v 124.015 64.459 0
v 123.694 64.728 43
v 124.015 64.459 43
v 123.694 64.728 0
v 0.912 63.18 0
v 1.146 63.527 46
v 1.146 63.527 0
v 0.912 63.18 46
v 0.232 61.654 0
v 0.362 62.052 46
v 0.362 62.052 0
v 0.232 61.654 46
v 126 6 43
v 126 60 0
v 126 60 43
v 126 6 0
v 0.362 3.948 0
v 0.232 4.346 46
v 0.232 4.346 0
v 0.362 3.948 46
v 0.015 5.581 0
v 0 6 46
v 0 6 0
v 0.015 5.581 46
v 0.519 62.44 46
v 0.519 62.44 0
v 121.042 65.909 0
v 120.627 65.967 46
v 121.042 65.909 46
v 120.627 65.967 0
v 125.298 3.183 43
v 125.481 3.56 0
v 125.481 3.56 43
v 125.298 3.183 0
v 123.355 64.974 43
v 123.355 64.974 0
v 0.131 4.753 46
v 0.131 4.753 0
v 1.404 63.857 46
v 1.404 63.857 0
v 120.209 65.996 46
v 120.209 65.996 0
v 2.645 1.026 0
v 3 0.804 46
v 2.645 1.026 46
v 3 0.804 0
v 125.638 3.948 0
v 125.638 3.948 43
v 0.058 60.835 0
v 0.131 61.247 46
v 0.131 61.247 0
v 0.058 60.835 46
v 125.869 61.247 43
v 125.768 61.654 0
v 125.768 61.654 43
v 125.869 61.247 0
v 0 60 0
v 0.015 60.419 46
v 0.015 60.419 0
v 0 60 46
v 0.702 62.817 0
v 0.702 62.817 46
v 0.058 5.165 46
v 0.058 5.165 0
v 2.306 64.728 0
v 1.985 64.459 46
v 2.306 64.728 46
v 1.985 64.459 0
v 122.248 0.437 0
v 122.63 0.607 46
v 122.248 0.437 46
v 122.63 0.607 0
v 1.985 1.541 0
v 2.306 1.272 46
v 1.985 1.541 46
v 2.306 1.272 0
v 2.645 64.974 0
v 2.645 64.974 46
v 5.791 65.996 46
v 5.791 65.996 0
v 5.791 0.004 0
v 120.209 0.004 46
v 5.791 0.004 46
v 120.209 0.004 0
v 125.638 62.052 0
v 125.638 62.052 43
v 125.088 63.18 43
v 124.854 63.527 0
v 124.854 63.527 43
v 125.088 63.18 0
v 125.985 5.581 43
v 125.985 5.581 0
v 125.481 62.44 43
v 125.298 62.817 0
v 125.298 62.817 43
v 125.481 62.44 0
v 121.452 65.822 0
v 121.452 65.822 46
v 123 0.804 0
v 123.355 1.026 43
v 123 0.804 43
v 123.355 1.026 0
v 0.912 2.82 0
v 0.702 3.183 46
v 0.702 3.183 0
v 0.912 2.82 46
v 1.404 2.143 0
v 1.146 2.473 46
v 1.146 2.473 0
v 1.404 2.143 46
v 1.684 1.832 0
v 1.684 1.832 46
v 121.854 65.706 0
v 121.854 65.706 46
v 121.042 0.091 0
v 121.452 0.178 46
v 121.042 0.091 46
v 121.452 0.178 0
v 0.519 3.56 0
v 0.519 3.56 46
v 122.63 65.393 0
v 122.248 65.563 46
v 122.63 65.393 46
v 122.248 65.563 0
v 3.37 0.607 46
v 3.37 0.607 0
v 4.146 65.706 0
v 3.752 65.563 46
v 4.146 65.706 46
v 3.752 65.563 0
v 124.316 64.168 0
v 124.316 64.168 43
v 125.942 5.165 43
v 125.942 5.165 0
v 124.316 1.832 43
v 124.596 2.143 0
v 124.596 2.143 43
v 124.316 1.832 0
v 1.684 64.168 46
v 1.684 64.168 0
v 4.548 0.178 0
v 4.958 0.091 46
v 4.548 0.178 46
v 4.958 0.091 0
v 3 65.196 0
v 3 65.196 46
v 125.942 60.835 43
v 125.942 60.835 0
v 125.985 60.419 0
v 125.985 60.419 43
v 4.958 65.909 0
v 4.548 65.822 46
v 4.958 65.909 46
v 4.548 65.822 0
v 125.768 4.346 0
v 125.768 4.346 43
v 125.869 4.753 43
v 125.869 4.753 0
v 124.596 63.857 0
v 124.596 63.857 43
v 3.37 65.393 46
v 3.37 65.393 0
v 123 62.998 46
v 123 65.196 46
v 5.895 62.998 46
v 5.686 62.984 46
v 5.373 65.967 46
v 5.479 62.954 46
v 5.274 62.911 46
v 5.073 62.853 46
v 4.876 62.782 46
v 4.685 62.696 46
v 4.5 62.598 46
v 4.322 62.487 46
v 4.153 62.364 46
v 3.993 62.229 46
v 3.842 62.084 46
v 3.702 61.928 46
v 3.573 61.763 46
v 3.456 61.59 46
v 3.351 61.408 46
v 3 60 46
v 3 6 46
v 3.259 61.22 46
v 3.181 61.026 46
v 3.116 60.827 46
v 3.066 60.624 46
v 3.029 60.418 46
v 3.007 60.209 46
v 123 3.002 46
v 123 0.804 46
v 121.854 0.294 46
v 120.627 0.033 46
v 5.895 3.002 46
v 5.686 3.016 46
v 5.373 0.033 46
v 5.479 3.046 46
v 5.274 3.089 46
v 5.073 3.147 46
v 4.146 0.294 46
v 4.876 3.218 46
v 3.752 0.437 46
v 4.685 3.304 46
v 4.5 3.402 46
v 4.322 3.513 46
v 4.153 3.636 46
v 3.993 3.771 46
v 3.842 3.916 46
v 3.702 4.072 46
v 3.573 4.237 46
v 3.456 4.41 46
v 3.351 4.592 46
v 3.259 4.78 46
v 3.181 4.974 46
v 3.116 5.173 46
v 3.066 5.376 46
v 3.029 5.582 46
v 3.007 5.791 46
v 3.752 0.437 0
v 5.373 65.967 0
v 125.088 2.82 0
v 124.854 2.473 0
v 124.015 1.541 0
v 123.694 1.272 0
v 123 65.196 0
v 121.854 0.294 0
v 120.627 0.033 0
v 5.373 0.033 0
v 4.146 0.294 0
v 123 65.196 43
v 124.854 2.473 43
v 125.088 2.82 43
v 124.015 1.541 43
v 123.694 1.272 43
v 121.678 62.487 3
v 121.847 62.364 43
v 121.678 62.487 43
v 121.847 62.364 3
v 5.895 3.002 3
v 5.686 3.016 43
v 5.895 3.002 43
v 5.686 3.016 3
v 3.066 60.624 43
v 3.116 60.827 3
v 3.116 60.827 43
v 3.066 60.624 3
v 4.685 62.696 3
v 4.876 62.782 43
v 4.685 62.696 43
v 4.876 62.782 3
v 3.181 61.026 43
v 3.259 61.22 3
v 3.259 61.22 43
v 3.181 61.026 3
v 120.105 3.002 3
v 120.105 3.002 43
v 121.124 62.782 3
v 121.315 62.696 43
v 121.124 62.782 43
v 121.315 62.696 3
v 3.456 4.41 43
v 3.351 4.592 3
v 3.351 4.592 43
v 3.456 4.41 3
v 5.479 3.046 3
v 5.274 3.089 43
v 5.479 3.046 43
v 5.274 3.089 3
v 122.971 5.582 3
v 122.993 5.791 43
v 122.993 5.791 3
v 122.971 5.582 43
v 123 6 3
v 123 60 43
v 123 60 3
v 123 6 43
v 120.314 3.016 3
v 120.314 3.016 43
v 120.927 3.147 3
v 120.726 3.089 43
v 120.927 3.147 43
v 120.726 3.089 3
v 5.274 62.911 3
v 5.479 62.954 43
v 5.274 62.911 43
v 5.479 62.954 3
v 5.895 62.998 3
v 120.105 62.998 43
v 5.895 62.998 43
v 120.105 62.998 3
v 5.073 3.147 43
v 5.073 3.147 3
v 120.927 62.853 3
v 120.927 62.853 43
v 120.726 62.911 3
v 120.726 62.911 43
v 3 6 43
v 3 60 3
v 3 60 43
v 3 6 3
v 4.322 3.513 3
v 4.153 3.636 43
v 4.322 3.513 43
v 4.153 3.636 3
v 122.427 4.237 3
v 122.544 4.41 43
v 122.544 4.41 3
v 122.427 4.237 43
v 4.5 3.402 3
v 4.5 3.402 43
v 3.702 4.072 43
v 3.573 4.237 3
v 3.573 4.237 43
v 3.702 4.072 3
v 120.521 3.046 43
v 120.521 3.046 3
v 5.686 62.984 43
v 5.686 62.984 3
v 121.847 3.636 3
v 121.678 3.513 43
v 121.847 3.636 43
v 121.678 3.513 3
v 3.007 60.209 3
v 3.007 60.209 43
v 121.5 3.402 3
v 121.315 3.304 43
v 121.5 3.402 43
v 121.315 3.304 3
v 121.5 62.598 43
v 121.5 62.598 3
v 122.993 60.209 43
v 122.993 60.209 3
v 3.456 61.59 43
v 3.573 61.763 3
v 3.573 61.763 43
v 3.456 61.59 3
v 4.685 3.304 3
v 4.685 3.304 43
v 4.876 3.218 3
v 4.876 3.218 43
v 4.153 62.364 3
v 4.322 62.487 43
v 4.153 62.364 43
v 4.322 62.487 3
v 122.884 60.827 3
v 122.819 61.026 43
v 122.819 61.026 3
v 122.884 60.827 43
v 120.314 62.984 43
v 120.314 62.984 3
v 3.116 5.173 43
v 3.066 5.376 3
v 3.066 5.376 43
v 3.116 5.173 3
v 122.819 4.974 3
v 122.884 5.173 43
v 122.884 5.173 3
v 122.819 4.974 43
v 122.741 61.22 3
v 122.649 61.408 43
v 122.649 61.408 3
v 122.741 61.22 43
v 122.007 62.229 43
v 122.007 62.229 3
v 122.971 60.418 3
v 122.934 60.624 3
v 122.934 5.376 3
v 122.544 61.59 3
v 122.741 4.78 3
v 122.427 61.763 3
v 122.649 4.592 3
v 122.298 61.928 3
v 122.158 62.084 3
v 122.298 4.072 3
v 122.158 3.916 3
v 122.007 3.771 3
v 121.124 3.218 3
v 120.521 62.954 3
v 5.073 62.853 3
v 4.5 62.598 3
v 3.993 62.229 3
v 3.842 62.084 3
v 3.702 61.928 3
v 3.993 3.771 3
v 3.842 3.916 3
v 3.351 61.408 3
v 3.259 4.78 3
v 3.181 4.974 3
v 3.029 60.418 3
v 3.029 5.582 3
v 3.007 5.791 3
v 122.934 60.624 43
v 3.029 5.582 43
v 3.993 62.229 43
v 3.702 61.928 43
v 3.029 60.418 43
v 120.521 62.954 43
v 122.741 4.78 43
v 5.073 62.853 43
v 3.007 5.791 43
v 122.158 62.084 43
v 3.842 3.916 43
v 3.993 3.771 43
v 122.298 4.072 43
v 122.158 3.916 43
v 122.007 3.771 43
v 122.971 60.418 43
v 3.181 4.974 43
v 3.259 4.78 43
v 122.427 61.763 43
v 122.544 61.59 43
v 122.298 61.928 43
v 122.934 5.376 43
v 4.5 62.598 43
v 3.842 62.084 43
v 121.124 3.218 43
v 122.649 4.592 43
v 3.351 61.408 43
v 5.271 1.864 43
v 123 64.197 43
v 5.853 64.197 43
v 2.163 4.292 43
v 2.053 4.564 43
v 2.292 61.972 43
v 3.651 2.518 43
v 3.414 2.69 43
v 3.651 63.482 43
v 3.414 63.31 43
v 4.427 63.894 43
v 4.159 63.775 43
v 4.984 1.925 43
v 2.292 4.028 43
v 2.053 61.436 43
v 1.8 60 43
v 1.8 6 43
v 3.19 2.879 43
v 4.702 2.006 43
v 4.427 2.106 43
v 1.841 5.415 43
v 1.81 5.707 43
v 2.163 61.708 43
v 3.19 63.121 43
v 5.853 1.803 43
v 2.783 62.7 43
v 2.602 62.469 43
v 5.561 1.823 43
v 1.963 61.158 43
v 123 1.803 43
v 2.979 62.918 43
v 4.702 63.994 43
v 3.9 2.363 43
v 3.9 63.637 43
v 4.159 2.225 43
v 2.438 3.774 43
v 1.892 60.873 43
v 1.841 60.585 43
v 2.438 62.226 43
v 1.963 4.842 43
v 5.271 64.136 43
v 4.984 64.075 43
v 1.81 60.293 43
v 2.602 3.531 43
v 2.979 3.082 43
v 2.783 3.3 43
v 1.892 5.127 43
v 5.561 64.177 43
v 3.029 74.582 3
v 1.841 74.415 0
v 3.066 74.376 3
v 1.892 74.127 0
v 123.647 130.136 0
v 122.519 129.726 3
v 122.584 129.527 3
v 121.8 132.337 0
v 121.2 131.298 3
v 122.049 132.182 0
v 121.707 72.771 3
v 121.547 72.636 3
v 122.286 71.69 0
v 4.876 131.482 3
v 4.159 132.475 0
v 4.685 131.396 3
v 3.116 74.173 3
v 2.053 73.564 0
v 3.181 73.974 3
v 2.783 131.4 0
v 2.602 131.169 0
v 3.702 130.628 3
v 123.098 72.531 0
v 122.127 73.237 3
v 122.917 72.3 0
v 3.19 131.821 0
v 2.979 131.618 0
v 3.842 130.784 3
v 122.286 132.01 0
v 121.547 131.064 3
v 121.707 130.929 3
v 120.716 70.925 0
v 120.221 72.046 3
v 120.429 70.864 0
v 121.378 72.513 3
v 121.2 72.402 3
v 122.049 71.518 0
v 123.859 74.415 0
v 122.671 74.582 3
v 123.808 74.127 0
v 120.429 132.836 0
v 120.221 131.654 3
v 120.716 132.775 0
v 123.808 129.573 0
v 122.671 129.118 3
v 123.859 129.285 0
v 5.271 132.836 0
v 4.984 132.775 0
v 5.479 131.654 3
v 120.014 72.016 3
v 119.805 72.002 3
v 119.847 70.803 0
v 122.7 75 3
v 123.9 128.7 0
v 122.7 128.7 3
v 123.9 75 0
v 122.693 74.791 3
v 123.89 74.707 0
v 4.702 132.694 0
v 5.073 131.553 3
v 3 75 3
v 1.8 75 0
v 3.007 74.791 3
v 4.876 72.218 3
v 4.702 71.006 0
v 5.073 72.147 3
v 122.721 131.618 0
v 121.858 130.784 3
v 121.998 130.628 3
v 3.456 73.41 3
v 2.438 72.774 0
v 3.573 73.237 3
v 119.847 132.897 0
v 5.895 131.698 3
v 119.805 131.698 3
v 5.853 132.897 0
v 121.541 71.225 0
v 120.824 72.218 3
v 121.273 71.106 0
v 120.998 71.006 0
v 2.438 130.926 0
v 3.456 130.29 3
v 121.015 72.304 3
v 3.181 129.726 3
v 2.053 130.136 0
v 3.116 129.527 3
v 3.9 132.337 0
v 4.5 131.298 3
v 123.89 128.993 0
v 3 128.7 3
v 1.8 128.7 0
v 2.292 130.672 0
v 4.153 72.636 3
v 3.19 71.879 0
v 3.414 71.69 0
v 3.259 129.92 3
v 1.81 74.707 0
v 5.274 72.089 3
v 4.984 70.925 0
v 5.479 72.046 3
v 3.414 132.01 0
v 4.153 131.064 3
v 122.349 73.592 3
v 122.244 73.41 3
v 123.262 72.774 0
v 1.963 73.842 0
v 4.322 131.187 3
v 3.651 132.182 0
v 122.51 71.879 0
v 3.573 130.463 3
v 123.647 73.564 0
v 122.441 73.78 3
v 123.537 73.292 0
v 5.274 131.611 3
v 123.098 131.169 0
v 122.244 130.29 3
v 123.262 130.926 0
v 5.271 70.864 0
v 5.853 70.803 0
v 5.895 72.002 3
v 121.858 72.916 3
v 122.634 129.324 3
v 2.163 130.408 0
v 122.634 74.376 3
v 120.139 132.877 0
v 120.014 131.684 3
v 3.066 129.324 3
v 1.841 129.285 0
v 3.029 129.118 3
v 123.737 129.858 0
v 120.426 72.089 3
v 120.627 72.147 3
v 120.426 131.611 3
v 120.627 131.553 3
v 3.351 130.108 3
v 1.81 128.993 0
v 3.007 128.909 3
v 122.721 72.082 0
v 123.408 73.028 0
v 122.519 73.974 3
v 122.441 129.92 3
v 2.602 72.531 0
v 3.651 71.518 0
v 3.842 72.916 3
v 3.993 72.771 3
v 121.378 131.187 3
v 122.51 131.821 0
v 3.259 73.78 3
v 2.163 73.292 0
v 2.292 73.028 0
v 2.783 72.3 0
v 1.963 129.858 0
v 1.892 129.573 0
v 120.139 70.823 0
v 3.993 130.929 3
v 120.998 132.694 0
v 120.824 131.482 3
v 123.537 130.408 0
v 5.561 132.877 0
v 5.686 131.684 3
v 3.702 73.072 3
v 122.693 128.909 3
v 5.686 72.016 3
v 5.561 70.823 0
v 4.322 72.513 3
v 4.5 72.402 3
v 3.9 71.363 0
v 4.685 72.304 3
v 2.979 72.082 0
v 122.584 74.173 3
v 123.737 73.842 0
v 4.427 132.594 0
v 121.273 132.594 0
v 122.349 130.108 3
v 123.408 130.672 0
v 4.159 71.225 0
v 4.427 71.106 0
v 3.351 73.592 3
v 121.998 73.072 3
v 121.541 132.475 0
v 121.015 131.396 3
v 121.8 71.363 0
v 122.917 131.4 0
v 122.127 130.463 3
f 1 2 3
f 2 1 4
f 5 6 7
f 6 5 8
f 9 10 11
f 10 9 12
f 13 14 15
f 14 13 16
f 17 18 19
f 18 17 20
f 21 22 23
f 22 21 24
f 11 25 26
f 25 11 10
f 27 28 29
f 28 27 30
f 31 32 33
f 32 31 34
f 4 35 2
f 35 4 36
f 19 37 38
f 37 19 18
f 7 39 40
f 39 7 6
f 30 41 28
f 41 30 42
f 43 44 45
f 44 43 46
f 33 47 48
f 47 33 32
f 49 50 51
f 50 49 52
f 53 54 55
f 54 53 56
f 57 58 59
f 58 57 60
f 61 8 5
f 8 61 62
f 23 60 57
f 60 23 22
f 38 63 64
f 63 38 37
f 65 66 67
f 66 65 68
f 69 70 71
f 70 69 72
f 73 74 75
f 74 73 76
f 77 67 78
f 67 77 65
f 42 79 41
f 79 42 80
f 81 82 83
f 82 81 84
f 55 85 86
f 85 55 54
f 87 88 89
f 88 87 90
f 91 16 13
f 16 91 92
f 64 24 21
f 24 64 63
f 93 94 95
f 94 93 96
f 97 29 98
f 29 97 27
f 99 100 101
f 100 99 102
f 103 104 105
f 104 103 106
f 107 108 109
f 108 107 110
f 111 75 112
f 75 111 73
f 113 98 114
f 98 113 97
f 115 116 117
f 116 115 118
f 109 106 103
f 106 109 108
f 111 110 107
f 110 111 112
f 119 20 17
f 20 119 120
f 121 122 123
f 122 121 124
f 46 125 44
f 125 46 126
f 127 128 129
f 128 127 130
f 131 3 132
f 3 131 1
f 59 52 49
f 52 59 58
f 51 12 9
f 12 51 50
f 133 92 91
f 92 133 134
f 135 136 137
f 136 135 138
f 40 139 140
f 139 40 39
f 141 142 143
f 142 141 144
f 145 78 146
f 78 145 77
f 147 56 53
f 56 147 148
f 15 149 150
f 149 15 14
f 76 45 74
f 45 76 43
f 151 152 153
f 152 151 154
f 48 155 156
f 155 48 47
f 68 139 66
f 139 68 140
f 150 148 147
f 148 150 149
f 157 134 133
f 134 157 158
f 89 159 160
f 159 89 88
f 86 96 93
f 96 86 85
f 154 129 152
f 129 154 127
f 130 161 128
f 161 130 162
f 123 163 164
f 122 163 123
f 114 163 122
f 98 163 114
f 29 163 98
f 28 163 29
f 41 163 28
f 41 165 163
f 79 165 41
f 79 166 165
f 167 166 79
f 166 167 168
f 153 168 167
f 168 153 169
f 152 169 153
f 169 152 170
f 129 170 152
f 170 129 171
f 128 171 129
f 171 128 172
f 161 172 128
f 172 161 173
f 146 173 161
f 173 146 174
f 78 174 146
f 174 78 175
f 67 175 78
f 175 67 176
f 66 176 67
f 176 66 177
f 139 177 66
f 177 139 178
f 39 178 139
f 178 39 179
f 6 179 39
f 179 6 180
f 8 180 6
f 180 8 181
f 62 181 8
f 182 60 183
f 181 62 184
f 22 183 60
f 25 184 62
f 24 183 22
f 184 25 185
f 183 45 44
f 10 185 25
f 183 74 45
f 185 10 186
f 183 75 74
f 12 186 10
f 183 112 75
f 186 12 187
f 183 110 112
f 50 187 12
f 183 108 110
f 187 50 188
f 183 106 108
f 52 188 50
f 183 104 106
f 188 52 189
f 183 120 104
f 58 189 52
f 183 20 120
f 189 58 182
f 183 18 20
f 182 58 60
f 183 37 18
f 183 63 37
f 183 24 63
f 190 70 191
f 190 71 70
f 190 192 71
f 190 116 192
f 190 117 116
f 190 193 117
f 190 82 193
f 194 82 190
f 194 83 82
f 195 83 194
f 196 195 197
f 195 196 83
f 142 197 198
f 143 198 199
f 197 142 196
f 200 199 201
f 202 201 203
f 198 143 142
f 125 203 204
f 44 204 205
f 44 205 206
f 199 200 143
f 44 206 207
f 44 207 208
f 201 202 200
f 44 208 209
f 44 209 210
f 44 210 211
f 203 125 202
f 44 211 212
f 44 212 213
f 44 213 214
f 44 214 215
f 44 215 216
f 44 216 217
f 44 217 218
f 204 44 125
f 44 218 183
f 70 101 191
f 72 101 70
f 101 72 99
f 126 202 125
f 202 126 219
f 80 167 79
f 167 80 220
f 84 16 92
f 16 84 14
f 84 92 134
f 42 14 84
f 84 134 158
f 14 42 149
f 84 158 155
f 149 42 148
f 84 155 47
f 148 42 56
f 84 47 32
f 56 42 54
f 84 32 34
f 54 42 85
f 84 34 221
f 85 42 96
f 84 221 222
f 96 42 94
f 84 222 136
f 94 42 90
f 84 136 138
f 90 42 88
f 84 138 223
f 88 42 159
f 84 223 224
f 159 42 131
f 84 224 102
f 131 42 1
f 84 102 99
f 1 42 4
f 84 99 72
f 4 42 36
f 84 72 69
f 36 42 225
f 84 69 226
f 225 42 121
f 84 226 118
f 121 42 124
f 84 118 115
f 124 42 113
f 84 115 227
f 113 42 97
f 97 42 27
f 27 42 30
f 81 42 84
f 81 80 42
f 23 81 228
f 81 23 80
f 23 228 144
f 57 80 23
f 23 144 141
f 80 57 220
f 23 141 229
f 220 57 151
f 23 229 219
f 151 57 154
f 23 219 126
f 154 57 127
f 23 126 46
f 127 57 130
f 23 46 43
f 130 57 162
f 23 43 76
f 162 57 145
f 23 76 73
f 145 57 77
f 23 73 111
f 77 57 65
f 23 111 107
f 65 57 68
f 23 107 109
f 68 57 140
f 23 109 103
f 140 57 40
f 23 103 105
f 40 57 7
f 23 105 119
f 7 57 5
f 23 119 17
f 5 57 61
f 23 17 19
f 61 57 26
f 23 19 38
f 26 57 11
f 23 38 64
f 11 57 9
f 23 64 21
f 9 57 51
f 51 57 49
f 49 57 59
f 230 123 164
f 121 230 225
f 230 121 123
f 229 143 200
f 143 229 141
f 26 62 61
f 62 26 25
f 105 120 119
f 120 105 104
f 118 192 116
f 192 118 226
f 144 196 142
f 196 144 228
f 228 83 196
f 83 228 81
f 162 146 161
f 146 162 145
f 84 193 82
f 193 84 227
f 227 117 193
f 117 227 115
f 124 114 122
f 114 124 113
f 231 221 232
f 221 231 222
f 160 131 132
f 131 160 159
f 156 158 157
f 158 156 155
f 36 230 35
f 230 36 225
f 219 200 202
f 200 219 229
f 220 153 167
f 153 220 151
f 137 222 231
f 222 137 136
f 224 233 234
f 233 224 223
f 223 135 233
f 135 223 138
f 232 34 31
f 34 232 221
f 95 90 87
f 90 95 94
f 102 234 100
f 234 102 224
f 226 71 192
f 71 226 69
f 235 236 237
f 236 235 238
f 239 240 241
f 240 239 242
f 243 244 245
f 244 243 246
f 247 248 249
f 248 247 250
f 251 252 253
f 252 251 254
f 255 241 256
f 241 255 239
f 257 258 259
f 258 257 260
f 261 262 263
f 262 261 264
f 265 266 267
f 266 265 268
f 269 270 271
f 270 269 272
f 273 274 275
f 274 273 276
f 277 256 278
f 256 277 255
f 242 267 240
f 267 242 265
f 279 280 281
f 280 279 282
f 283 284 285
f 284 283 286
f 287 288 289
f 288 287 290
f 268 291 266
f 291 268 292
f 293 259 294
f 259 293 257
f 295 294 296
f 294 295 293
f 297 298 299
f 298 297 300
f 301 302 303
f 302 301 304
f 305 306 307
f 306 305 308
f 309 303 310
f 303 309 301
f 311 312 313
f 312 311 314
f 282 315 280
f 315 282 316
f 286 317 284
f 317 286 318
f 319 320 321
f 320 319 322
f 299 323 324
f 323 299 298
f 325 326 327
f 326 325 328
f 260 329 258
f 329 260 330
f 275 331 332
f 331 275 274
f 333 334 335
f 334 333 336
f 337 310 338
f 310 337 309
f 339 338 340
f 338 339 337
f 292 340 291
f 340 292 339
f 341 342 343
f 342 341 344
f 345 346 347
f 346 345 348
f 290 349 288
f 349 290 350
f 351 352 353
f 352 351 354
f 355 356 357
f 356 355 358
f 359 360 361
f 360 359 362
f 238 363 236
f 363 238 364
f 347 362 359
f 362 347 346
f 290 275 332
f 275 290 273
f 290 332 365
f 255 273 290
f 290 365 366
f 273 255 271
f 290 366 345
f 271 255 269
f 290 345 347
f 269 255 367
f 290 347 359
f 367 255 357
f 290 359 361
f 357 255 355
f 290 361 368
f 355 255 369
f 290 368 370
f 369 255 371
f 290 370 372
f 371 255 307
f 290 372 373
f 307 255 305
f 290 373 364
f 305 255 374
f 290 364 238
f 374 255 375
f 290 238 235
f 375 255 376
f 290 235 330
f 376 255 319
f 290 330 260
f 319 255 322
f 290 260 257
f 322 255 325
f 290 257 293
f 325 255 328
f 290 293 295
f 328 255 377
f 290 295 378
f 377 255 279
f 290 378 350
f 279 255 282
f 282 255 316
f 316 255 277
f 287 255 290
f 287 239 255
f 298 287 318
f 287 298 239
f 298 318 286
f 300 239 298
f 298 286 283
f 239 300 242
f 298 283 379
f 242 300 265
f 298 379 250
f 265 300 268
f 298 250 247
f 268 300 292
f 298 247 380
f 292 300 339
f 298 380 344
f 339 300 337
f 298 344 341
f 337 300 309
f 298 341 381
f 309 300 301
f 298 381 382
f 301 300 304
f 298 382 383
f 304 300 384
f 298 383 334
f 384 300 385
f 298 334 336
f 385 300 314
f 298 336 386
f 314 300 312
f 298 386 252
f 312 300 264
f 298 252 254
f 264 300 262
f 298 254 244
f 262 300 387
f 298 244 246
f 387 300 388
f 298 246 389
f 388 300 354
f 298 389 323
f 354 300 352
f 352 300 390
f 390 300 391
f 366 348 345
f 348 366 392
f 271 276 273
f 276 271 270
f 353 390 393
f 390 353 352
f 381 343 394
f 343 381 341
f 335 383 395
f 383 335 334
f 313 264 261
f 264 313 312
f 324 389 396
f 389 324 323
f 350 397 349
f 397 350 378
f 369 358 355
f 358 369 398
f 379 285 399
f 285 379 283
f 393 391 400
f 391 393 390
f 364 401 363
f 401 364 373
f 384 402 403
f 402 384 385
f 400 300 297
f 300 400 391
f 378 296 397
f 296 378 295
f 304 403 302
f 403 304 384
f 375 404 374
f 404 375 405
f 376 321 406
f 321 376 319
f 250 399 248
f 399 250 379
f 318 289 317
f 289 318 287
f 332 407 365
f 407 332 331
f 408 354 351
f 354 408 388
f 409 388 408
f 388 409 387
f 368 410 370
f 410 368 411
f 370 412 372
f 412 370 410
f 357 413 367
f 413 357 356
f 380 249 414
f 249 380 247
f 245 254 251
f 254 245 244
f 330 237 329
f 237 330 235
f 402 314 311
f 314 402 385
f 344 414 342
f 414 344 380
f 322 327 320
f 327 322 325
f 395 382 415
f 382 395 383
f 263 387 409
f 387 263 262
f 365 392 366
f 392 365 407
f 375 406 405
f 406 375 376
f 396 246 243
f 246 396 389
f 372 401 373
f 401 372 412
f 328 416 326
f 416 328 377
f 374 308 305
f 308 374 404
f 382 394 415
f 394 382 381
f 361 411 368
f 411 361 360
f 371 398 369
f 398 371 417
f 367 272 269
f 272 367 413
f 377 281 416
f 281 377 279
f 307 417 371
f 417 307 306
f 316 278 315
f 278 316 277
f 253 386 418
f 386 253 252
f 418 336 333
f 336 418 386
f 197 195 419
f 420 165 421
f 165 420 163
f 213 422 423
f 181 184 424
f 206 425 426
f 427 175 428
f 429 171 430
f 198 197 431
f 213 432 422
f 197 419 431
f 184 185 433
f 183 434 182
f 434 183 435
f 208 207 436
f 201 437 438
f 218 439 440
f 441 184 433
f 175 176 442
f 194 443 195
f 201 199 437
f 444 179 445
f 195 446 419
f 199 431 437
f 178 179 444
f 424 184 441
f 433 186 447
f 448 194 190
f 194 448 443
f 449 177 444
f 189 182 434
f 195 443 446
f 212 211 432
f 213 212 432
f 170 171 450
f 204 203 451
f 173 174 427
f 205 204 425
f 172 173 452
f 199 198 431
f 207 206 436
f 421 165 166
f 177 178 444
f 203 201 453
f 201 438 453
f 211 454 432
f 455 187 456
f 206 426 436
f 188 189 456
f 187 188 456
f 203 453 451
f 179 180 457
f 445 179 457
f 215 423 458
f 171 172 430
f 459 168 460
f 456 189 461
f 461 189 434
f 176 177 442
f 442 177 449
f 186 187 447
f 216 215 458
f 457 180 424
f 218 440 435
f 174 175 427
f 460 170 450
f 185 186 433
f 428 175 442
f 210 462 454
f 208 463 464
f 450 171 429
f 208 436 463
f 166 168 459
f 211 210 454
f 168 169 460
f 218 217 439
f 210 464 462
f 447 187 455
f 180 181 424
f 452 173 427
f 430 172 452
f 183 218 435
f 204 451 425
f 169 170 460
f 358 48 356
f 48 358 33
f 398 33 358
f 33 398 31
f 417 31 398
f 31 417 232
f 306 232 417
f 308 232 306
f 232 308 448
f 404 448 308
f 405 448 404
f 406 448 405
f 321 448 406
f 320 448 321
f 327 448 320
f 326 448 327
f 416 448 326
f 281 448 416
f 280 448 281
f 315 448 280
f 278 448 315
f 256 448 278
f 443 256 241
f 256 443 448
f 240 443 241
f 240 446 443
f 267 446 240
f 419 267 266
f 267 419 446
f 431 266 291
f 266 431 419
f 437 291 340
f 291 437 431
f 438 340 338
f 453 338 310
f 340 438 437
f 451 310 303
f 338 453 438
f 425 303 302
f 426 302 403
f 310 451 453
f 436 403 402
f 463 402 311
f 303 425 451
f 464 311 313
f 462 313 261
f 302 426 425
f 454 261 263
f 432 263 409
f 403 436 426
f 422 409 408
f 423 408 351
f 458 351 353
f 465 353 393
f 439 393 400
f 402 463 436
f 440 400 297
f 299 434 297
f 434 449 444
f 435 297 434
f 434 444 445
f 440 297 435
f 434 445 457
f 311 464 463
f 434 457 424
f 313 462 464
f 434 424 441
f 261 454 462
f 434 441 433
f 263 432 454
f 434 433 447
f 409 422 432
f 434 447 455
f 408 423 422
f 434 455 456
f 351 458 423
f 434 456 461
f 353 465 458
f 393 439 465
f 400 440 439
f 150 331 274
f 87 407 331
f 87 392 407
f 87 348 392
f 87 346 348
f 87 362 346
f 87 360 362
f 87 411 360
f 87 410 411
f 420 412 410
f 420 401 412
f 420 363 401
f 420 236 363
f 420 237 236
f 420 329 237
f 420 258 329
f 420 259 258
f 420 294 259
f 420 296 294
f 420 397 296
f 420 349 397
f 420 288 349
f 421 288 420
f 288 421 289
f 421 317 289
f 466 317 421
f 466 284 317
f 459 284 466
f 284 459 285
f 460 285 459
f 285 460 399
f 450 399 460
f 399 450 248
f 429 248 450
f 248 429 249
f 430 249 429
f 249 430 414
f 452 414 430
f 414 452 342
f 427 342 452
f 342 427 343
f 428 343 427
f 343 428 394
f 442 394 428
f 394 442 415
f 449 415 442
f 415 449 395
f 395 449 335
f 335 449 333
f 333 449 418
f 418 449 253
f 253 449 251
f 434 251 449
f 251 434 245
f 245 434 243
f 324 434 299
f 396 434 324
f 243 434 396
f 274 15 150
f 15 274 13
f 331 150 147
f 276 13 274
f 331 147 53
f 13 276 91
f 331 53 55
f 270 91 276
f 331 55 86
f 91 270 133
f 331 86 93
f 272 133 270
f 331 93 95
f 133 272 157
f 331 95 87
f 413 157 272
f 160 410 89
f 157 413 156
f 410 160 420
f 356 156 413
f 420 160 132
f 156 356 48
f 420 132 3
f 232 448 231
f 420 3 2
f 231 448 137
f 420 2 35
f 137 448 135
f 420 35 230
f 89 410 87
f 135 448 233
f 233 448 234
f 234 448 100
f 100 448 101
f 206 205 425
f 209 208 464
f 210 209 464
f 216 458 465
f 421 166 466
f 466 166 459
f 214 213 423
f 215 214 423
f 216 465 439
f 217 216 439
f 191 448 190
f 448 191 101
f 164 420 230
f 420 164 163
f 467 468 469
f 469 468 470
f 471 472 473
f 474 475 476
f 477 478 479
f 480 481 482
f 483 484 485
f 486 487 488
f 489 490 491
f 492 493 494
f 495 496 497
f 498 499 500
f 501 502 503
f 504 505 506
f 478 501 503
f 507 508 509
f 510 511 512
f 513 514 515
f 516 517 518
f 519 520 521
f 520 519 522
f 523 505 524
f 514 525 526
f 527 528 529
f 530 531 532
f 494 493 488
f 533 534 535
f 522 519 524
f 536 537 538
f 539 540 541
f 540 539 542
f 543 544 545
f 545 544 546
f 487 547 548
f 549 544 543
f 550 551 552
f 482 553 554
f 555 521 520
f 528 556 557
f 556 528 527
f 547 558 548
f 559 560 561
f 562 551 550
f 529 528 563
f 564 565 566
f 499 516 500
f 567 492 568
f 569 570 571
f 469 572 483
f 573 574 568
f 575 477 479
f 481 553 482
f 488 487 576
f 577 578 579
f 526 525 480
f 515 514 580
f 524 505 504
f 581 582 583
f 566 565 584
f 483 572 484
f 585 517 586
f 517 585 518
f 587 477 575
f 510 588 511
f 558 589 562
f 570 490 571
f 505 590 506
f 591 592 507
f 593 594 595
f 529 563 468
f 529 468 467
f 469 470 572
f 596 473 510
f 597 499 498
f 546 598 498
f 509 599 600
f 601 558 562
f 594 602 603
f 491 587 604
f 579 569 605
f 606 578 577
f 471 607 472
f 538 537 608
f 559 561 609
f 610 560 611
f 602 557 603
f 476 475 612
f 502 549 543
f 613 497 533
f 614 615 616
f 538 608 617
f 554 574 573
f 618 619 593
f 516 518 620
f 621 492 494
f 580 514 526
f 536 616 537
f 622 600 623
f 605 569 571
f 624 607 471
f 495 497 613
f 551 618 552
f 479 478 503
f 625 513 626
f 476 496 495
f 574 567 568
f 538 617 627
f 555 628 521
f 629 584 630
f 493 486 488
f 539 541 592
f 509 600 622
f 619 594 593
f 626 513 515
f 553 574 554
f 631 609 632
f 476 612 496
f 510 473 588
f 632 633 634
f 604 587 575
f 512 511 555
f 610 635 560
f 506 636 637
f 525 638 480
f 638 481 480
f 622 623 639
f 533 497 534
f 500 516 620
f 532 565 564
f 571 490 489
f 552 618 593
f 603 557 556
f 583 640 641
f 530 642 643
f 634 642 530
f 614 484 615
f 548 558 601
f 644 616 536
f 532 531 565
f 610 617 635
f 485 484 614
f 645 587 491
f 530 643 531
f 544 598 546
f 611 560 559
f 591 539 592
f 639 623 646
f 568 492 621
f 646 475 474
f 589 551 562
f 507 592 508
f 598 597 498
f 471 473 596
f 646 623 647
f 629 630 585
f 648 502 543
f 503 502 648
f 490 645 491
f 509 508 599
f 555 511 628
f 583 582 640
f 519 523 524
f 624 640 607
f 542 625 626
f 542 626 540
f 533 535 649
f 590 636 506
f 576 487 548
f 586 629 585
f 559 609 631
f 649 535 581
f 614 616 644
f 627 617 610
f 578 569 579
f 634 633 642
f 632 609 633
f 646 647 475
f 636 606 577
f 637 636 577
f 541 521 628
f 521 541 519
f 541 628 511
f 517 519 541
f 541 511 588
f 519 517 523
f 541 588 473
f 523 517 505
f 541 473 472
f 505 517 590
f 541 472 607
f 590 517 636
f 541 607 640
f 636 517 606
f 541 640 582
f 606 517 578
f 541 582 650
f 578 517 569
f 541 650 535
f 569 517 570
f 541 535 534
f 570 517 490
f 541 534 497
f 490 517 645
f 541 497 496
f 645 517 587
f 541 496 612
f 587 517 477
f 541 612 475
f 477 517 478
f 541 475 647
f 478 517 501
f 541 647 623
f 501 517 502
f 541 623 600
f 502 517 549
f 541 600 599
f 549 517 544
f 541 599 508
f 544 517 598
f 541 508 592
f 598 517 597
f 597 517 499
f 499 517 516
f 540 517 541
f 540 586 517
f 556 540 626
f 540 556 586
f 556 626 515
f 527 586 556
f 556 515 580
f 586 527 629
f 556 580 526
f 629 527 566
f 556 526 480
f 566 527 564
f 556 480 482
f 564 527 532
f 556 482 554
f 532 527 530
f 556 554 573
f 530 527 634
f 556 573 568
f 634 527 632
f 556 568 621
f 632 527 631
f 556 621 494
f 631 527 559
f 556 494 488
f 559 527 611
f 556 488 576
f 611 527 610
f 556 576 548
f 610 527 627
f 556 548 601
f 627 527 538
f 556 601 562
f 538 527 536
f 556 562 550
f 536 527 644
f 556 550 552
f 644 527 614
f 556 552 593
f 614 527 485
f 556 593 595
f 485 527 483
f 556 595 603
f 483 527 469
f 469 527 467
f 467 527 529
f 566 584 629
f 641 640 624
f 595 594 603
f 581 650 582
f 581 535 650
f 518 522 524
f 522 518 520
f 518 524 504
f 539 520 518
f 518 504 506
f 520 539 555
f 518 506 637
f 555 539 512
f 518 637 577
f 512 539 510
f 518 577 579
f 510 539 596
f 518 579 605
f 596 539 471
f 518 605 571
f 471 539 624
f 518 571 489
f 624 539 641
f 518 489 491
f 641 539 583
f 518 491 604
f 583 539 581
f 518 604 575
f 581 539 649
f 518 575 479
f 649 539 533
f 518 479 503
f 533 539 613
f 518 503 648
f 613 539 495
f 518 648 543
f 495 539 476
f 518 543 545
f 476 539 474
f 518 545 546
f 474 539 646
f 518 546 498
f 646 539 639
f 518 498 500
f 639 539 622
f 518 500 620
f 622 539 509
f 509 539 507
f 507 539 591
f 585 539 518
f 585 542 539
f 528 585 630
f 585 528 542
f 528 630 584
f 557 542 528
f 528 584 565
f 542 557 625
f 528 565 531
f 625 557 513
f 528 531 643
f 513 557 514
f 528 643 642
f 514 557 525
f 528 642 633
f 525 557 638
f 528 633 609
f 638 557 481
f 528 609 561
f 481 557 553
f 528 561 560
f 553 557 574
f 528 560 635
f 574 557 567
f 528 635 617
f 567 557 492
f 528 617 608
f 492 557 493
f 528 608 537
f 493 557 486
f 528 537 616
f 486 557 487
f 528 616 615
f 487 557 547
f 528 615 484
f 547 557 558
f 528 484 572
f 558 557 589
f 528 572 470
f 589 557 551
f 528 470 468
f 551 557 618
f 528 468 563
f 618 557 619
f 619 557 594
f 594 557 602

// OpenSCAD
inner_dimensions = [120, 60, 40];

wall_thickness = 3;
edge_roundness = 6;
bevel = 0.4;

tolerance = 0.15;

separation = wall_thickness;

img = "img.dxf";
img_depth = 1;
img_border = 5;

$fn = 90;

// Check assumptions
assert(bevel >= 0);
assert(bevel <= 1);
assert(wall_thickness < edge_roundness);

box_with_slider(inner_dimensions, wall_thickness, edge_roundness, bevel);

translate([0, inner_dimensions[1] + 2*wall_thickness + separation, 0])
lid_with_image([inner_dimensions[0] - 2*tolerance,
		inner_dimensions[1] - 2*tolerance,
		wall_thickness],
	       edge_roundness, wall_thickness, bevel,
	       img, img_depth, img_border);

module lid_with_image(dimensions, edge_roundness, wall_thickness, bevel,
		      img, img_depth, img_border)
{
	img_size = min(dimensions[0], dimensions[1]) - img_border*2;

	difference () {
		lid(dimensions, edge_roundness, wall_thickness, bevel);

		translate([dimensions[0]/2 + wall_thickness - img_size/2,
			   dimensions[1]/2 + wall_thickness - img_size/2,
			   wall_thickness])
		image(img, img_depth, img_size);
	}
}

module image(img, img_depth, img_size)
{
	// Will be centred in the z-axis, and in the positive x,y quadrant.
	resize([img_size, img_size, img_depth * 2])
	linear_extrude(1, center=true)
	import(img);
}

module lid(dimensions, edge_roundness, wall_thickness, bevel)
{
	corner_r1 = edge_roundness - wall_thickness + bevel*wall_thickness;
	corner_r2 = edge_roundness - wall_thickness;

	near_x_point = edge_roundness;
	near_y_point = edge_roundness;
	far_x_point = dimensions[0] - edge_roundness + 2*wall_thickness;
	far_y_point = dimensions[1] - edge_roundness + 2*wall_thickness;

	hull() {
		translate([near_x_point, near_y_point, 0])
		cylinder(dimensions[2], corner_r1, corner_r2);

		translate([near_x_point, far_y_point, 0])
		cylinder(dimensions[2], corner_r1, corner_r2);

		translate([far_x_point, near_y_point, 0])
		cylinder(dimensions[2], corner_r1, corner_r2);

		translate([far_x_point, far_y_point, 0])
		cylinder(dimensions[2], corner_r1, corner_r2);
	}
}

module box_with_slider(inner_dimensions, wall_thickness, edge_roundness, bevel)
{
	difference() {
		box(inner_dimensions, wall_thickness, edge_roundness);

		// Create an extra-long lid to create the main runners for the
		// slider.
		translate([0, 0, wall_thickness + inner_dimensions[2]])
		lid([inner_dimensions[0] + 2*wall_thickness,
		     inner_dimensions[1],
		     wall_thickness],
		    edge_roundness, wall_thickness, bevel);

		// To avoid an odd curve, also remove a box at the end of the
		// slide.
		translate([inner_dimensions[0] + wall_thickness, 0,
			   inner_dimensions[2] + wall_thickness])
		cube([wall_thickness*2,
		      inner_dimensions[1] + 2*wall_thickness,
		      wall_thickness*2]);
	}
}

module box(inner_dimensions, wall_thickness, edge_roundness)
{
	outer_dimensions = [inner_dimensions[0] + 2*wall_thickness,
			    inner_dimensions[1] + 2*wall_thickness,
			    inner_dimensions[2] + 2*wall_thickness];

	difference() {
		rounded_cube(outer_dimensions, edge_roundness);

		translate([wall_thickness, wall_thickness, wall_thickness])
		rounded_cube([inner_dimensions[0],
			      inner_dimensions[1],
			      inner_dimensions[2] + 2*wall_thickness],
			     edge_roundness - wall_thickness);
	}
}

module rounded_cube(dimensions, edge_roundness) {
	near_x_point = edge_roundness;
	near_y_point = edge_roundness;

	far_x_point = dimensions[0] - edge_roundness;
	far_y_point = dimensions[1] - edge_roundness;

	hull() {
		translate([near_x_point, near_y_point, 0])
		cylinder(dimensions[2], r=edge_roundness);

		translate([near_x_point, far_y_point, 0])
		cylinder(dimensions[2], r=edge_roundness);

		translate([far_x_point, near_y_point, 0])
		cylinder(dimensions[2], r=edge_roundness);

		translate([far_x_point, far_y_point, 0])
		cylinder(dimensions[2], r=edge_roundness);
	}
}
